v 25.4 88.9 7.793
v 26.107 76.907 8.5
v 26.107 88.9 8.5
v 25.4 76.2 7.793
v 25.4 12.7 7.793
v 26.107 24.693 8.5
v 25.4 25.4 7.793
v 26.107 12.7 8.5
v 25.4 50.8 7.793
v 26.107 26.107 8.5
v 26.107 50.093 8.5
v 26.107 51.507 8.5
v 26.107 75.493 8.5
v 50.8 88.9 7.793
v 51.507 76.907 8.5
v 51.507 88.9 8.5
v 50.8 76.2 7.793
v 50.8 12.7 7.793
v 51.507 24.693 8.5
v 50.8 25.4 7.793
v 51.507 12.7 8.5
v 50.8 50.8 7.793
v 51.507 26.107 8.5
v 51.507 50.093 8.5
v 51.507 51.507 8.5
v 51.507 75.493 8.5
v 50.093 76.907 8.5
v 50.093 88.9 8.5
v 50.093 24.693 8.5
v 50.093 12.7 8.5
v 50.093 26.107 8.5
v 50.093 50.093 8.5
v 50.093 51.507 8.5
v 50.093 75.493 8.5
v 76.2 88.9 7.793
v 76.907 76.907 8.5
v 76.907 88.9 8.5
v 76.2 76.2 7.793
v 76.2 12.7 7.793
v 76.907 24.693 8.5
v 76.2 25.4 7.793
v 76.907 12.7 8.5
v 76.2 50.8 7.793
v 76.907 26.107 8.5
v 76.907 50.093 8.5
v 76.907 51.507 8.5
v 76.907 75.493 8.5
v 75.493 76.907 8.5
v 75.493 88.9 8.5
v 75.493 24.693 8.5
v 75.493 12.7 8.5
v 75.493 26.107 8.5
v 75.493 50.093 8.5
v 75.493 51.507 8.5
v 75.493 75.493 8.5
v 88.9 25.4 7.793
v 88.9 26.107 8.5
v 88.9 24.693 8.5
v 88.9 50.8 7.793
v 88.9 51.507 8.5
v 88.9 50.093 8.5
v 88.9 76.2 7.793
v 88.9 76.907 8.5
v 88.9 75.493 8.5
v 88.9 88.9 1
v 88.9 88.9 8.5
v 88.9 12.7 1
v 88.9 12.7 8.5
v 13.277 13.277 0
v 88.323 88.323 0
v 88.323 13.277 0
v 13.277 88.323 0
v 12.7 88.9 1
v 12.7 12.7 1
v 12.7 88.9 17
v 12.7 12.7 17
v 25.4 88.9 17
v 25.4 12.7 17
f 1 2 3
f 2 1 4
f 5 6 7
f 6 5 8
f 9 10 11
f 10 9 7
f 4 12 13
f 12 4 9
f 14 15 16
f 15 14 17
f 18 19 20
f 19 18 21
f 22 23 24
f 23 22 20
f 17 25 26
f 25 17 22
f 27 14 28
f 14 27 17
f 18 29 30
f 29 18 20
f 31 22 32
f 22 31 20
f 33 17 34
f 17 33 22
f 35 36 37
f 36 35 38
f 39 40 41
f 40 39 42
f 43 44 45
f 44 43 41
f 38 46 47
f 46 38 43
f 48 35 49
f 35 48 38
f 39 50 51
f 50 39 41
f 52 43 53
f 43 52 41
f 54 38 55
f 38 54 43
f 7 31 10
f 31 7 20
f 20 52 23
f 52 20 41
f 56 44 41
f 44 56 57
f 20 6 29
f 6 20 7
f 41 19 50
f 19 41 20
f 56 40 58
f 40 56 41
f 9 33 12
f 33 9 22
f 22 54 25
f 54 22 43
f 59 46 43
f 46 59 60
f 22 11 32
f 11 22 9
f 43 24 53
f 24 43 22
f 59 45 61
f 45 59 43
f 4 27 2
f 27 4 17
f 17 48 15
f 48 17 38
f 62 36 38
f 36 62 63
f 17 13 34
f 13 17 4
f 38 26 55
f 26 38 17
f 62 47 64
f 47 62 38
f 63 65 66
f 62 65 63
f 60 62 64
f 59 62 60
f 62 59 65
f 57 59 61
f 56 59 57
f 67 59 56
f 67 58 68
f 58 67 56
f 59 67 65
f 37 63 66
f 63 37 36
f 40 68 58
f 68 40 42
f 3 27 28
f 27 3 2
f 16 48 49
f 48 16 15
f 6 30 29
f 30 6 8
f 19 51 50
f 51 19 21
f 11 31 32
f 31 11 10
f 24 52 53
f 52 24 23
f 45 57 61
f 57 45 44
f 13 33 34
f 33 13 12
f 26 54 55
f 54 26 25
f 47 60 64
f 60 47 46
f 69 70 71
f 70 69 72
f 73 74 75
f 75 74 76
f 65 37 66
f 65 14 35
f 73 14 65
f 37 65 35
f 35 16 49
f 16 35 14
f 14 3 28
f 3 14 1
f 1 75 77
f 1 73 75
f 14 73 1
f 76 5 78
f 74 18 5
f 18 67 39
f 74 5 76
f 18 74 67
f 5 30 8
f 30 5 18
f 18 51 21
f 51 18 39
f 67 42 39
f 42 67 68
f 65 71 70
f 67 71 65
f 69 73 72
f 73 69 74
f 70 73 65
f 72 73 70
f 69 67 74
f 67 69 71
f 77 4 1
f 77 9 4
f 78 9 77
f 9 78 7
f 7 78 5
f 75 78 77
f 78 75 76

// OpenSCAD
thickness=8.5;
tilex=3;
tiley=3;
inch=25.4;
groove=1;

//floor
difference()
{
    
    translate([tilex*inch/2+inch/2,tiley*inch/2+inch/2,thickness/2])cube([tilex*inch,tiley*inch,thickness],center=true);
    pocks=floor(rands(0,(tilex*tiley)*.75,1)[0]);
    echo (pocks);
    for (ii=[0:pocks])
    {
        shapenum = floor(rands(0,16,1)[0])+1;
        angle=floor(rands(0,360,1)[0])+1;
        xx=inch*(rands(0,tilex,1)[0])+inch/2;
        yy=inch*(rands(0,tiley,1)[0])+inch/2;
        translate([xx,yy,0])rotate([0,0,angle])translate([0,0,thickness])blemish(shapenum);
    }
    for (ii=[0:tilex])
    {
        translate([ii*inch,tiley*inch/2,thickness])rotate([0,45,0])cube([groove,tiley*inch*2,groove],center=true);
    }
    for (ii=[0:tiley])
    {
        translate([tilex*inch/2,ii*inch,thickness])rotate([45,0,0])cube([tilex*inch*2,groove,groove],center=true);
    }
    translate([tilex*inch+inch/2,tiley*inch/2+inch/2,0])rotate([0,30,0])cube([groove,tiley*inch*2,groove*2],center=true);
    translate([0+inch/2,tiley*inch/2+inch/2,0])rotate([0,60,0])cube([groove*2,tiley*inch*2,groove],center=true);
    translate([tilex*inch/2+inch/2,tiley*inch+inch/2,0])rotate([60,0,0])cube([tilex*inch*2,groove*2,groove],center=true);
    translate([tilex*inch/2+inch/2,0+inch/2,0])rotate([30,0,0])cube([tilex*inch*2,groove,groove*2],center=true);
}
//wall
difference()
{
    translate([inch/2+inch/4,tiley*inch/2+inch/2,thickness])cube([inch/2,tiley*inch,thickness*2],center=true);
    //pocks=floor(rands(0,(tilex)*.75,1)[0]);
    pocks=0;
    echo (pocks);
    for (ii=[0:pocks])
    {
        shapenum = floor(rands(0,16,1)[0])+1;
        angle=floor(rands(0,360,1)[0])+1;
        xx=(thickness+.5*inch)*(rands(0,1,1)[0])+inch/2;
        yy=inch*(rands(0,tiley,1)[0]);
        zz=inch-xx;
        %translate([xx,yy,thickness*2])rotate([0,0,angle])blemish(shapenum);
        %translate([inch,yy,thickness*2+zz])rotate([0,90,0])rotate([0,0,angle])blemish(shapenum);
        
    }
    translate([tilex*inch+inch/2,tiley*inch/2+inch/2,0])rotate([0,30,0])cube([groove,tiley*inch*2,groove*2],center=true);
    translate([0+inch/2,tiley*inch/2+inch/2,0])rotate([0,60,0])cube([groove*2,tiley*inch*2,groove],center=true);
    translate([tilex*inch/2+inch/2,tiley*inch+inch/2,0])rotate([60,0,0])cube([tilex*inch*2,groove*2,groove],center=true);
    translate([tilex*inch/2+inch/2,0+inch/2,0])rotate([30,0,0])cube([tilex*inch*2,groove,groove*2],center=true);
    
}

module selectshape(shapenum)
{
    
    if (shapenum==1){ shape01(); }
    if (shapenum==2){ shape02(); }
    if (shapenum==3){ shape03(); }
    if (shapenum==4){ shape04(); }
    if (shapenum==5){ shape05(); }
    if (shapenum==6){ shape06(); }
    if (shapenum==7){ shape07(); }
    if (shapenum==8){ shape08(); }
    if (shapenum==9){ shape09(); }
    if (shapenum==10){ shape10(); }
    if (shapenum==11){ shape11(); }
    if (shapenum==12){ shape12(); }
    if (shapenum==13){ shape13(); }
    if (shapenum==14){ shape14(); }
    if (shapenum==15){ shape15(); }
    if (shapenum==16){ shape16(); }
}
module blemish(shapenum)
{
    
    {
        translate([0,0,-.5])linear_extrude(height=.101)selectshape(shapenum);
        translate([0,0,-.4])linear_extrude(height=.101)minkowski(){selectshape(shapenum); circle(r=.1);}
        translate([0,0,-.3])linear_extrude(height=.101)minkowski(){selectshape(shapenum); circle(r=.2);}
        translate([0,0,-.2])linear_extrude(height=.101)minkowski(){selectshape(shapenum); circle(r=.3);}
        translate([0,0,-.1])linear_extrude(height=.101)minkowski(){selectshape(shapenum); circle(r=.4);}
    }
}
module shape01()
{
    translate([-3,-2])scale(.8)import("blemish/shape001.dxf");
}
module shape02()
{
    translate([-3,-2])scale(.8)import("blemish/shape002.dxf");
}
module shape03()
{
    translate([-3,-2,0])scale(.8)import("blemish/shape003.dxf");
}
module shape04()
{
    translate([-14,-18,0])scale(.8)import("blemish/shape004.dxf");
}
module shape05()
{
    translate([-13,-10,0])scale(.8)import("blemish/shape005.dxf");
}
module shape06()
{
    translate([-2,-4,0])scale(.32)import("blemish/shape006.dxf");
}
module shape07()
{
    translate([-9,-9,0])scale(.3)import("blemish/shape007.dxf");
}
module shape08()
{
    translate([-6,-12,0])scale(.6)import("blemish/shape008.dxf");
}
module shape09()
{
    translate([-2,-2,0])scale(.2)import("blemish/shape009.dxf");
}
module shape10()
{
    translate([-1,-3,0])scale(.1)import("blemish/shape010.dxf");
}
module shape11()
{
    translate([-2,-4,0])scale(.3)import("blemish/shape011.dxf");
}
module shape12()
{
    translate([-6,-2,0])scale(.6)import("blemish/shape012.dxf");
}
module shape13()
{
    translate([-9,-14,0])scale(.7)import("blemish/shape013.dxf");
}
module shape14()
{
    translate([-0.5,-1,0])scale(.1)import("blemish/shape014.dxf");
}
module shape15()
{
    translate([-.5,-.5,0])scale(.1)import("blemish/shape015.dxf");
}
module shape16()
{
    translate([-6,-6,0])scale(.5)import("blemish/shape016.dxf");
}
